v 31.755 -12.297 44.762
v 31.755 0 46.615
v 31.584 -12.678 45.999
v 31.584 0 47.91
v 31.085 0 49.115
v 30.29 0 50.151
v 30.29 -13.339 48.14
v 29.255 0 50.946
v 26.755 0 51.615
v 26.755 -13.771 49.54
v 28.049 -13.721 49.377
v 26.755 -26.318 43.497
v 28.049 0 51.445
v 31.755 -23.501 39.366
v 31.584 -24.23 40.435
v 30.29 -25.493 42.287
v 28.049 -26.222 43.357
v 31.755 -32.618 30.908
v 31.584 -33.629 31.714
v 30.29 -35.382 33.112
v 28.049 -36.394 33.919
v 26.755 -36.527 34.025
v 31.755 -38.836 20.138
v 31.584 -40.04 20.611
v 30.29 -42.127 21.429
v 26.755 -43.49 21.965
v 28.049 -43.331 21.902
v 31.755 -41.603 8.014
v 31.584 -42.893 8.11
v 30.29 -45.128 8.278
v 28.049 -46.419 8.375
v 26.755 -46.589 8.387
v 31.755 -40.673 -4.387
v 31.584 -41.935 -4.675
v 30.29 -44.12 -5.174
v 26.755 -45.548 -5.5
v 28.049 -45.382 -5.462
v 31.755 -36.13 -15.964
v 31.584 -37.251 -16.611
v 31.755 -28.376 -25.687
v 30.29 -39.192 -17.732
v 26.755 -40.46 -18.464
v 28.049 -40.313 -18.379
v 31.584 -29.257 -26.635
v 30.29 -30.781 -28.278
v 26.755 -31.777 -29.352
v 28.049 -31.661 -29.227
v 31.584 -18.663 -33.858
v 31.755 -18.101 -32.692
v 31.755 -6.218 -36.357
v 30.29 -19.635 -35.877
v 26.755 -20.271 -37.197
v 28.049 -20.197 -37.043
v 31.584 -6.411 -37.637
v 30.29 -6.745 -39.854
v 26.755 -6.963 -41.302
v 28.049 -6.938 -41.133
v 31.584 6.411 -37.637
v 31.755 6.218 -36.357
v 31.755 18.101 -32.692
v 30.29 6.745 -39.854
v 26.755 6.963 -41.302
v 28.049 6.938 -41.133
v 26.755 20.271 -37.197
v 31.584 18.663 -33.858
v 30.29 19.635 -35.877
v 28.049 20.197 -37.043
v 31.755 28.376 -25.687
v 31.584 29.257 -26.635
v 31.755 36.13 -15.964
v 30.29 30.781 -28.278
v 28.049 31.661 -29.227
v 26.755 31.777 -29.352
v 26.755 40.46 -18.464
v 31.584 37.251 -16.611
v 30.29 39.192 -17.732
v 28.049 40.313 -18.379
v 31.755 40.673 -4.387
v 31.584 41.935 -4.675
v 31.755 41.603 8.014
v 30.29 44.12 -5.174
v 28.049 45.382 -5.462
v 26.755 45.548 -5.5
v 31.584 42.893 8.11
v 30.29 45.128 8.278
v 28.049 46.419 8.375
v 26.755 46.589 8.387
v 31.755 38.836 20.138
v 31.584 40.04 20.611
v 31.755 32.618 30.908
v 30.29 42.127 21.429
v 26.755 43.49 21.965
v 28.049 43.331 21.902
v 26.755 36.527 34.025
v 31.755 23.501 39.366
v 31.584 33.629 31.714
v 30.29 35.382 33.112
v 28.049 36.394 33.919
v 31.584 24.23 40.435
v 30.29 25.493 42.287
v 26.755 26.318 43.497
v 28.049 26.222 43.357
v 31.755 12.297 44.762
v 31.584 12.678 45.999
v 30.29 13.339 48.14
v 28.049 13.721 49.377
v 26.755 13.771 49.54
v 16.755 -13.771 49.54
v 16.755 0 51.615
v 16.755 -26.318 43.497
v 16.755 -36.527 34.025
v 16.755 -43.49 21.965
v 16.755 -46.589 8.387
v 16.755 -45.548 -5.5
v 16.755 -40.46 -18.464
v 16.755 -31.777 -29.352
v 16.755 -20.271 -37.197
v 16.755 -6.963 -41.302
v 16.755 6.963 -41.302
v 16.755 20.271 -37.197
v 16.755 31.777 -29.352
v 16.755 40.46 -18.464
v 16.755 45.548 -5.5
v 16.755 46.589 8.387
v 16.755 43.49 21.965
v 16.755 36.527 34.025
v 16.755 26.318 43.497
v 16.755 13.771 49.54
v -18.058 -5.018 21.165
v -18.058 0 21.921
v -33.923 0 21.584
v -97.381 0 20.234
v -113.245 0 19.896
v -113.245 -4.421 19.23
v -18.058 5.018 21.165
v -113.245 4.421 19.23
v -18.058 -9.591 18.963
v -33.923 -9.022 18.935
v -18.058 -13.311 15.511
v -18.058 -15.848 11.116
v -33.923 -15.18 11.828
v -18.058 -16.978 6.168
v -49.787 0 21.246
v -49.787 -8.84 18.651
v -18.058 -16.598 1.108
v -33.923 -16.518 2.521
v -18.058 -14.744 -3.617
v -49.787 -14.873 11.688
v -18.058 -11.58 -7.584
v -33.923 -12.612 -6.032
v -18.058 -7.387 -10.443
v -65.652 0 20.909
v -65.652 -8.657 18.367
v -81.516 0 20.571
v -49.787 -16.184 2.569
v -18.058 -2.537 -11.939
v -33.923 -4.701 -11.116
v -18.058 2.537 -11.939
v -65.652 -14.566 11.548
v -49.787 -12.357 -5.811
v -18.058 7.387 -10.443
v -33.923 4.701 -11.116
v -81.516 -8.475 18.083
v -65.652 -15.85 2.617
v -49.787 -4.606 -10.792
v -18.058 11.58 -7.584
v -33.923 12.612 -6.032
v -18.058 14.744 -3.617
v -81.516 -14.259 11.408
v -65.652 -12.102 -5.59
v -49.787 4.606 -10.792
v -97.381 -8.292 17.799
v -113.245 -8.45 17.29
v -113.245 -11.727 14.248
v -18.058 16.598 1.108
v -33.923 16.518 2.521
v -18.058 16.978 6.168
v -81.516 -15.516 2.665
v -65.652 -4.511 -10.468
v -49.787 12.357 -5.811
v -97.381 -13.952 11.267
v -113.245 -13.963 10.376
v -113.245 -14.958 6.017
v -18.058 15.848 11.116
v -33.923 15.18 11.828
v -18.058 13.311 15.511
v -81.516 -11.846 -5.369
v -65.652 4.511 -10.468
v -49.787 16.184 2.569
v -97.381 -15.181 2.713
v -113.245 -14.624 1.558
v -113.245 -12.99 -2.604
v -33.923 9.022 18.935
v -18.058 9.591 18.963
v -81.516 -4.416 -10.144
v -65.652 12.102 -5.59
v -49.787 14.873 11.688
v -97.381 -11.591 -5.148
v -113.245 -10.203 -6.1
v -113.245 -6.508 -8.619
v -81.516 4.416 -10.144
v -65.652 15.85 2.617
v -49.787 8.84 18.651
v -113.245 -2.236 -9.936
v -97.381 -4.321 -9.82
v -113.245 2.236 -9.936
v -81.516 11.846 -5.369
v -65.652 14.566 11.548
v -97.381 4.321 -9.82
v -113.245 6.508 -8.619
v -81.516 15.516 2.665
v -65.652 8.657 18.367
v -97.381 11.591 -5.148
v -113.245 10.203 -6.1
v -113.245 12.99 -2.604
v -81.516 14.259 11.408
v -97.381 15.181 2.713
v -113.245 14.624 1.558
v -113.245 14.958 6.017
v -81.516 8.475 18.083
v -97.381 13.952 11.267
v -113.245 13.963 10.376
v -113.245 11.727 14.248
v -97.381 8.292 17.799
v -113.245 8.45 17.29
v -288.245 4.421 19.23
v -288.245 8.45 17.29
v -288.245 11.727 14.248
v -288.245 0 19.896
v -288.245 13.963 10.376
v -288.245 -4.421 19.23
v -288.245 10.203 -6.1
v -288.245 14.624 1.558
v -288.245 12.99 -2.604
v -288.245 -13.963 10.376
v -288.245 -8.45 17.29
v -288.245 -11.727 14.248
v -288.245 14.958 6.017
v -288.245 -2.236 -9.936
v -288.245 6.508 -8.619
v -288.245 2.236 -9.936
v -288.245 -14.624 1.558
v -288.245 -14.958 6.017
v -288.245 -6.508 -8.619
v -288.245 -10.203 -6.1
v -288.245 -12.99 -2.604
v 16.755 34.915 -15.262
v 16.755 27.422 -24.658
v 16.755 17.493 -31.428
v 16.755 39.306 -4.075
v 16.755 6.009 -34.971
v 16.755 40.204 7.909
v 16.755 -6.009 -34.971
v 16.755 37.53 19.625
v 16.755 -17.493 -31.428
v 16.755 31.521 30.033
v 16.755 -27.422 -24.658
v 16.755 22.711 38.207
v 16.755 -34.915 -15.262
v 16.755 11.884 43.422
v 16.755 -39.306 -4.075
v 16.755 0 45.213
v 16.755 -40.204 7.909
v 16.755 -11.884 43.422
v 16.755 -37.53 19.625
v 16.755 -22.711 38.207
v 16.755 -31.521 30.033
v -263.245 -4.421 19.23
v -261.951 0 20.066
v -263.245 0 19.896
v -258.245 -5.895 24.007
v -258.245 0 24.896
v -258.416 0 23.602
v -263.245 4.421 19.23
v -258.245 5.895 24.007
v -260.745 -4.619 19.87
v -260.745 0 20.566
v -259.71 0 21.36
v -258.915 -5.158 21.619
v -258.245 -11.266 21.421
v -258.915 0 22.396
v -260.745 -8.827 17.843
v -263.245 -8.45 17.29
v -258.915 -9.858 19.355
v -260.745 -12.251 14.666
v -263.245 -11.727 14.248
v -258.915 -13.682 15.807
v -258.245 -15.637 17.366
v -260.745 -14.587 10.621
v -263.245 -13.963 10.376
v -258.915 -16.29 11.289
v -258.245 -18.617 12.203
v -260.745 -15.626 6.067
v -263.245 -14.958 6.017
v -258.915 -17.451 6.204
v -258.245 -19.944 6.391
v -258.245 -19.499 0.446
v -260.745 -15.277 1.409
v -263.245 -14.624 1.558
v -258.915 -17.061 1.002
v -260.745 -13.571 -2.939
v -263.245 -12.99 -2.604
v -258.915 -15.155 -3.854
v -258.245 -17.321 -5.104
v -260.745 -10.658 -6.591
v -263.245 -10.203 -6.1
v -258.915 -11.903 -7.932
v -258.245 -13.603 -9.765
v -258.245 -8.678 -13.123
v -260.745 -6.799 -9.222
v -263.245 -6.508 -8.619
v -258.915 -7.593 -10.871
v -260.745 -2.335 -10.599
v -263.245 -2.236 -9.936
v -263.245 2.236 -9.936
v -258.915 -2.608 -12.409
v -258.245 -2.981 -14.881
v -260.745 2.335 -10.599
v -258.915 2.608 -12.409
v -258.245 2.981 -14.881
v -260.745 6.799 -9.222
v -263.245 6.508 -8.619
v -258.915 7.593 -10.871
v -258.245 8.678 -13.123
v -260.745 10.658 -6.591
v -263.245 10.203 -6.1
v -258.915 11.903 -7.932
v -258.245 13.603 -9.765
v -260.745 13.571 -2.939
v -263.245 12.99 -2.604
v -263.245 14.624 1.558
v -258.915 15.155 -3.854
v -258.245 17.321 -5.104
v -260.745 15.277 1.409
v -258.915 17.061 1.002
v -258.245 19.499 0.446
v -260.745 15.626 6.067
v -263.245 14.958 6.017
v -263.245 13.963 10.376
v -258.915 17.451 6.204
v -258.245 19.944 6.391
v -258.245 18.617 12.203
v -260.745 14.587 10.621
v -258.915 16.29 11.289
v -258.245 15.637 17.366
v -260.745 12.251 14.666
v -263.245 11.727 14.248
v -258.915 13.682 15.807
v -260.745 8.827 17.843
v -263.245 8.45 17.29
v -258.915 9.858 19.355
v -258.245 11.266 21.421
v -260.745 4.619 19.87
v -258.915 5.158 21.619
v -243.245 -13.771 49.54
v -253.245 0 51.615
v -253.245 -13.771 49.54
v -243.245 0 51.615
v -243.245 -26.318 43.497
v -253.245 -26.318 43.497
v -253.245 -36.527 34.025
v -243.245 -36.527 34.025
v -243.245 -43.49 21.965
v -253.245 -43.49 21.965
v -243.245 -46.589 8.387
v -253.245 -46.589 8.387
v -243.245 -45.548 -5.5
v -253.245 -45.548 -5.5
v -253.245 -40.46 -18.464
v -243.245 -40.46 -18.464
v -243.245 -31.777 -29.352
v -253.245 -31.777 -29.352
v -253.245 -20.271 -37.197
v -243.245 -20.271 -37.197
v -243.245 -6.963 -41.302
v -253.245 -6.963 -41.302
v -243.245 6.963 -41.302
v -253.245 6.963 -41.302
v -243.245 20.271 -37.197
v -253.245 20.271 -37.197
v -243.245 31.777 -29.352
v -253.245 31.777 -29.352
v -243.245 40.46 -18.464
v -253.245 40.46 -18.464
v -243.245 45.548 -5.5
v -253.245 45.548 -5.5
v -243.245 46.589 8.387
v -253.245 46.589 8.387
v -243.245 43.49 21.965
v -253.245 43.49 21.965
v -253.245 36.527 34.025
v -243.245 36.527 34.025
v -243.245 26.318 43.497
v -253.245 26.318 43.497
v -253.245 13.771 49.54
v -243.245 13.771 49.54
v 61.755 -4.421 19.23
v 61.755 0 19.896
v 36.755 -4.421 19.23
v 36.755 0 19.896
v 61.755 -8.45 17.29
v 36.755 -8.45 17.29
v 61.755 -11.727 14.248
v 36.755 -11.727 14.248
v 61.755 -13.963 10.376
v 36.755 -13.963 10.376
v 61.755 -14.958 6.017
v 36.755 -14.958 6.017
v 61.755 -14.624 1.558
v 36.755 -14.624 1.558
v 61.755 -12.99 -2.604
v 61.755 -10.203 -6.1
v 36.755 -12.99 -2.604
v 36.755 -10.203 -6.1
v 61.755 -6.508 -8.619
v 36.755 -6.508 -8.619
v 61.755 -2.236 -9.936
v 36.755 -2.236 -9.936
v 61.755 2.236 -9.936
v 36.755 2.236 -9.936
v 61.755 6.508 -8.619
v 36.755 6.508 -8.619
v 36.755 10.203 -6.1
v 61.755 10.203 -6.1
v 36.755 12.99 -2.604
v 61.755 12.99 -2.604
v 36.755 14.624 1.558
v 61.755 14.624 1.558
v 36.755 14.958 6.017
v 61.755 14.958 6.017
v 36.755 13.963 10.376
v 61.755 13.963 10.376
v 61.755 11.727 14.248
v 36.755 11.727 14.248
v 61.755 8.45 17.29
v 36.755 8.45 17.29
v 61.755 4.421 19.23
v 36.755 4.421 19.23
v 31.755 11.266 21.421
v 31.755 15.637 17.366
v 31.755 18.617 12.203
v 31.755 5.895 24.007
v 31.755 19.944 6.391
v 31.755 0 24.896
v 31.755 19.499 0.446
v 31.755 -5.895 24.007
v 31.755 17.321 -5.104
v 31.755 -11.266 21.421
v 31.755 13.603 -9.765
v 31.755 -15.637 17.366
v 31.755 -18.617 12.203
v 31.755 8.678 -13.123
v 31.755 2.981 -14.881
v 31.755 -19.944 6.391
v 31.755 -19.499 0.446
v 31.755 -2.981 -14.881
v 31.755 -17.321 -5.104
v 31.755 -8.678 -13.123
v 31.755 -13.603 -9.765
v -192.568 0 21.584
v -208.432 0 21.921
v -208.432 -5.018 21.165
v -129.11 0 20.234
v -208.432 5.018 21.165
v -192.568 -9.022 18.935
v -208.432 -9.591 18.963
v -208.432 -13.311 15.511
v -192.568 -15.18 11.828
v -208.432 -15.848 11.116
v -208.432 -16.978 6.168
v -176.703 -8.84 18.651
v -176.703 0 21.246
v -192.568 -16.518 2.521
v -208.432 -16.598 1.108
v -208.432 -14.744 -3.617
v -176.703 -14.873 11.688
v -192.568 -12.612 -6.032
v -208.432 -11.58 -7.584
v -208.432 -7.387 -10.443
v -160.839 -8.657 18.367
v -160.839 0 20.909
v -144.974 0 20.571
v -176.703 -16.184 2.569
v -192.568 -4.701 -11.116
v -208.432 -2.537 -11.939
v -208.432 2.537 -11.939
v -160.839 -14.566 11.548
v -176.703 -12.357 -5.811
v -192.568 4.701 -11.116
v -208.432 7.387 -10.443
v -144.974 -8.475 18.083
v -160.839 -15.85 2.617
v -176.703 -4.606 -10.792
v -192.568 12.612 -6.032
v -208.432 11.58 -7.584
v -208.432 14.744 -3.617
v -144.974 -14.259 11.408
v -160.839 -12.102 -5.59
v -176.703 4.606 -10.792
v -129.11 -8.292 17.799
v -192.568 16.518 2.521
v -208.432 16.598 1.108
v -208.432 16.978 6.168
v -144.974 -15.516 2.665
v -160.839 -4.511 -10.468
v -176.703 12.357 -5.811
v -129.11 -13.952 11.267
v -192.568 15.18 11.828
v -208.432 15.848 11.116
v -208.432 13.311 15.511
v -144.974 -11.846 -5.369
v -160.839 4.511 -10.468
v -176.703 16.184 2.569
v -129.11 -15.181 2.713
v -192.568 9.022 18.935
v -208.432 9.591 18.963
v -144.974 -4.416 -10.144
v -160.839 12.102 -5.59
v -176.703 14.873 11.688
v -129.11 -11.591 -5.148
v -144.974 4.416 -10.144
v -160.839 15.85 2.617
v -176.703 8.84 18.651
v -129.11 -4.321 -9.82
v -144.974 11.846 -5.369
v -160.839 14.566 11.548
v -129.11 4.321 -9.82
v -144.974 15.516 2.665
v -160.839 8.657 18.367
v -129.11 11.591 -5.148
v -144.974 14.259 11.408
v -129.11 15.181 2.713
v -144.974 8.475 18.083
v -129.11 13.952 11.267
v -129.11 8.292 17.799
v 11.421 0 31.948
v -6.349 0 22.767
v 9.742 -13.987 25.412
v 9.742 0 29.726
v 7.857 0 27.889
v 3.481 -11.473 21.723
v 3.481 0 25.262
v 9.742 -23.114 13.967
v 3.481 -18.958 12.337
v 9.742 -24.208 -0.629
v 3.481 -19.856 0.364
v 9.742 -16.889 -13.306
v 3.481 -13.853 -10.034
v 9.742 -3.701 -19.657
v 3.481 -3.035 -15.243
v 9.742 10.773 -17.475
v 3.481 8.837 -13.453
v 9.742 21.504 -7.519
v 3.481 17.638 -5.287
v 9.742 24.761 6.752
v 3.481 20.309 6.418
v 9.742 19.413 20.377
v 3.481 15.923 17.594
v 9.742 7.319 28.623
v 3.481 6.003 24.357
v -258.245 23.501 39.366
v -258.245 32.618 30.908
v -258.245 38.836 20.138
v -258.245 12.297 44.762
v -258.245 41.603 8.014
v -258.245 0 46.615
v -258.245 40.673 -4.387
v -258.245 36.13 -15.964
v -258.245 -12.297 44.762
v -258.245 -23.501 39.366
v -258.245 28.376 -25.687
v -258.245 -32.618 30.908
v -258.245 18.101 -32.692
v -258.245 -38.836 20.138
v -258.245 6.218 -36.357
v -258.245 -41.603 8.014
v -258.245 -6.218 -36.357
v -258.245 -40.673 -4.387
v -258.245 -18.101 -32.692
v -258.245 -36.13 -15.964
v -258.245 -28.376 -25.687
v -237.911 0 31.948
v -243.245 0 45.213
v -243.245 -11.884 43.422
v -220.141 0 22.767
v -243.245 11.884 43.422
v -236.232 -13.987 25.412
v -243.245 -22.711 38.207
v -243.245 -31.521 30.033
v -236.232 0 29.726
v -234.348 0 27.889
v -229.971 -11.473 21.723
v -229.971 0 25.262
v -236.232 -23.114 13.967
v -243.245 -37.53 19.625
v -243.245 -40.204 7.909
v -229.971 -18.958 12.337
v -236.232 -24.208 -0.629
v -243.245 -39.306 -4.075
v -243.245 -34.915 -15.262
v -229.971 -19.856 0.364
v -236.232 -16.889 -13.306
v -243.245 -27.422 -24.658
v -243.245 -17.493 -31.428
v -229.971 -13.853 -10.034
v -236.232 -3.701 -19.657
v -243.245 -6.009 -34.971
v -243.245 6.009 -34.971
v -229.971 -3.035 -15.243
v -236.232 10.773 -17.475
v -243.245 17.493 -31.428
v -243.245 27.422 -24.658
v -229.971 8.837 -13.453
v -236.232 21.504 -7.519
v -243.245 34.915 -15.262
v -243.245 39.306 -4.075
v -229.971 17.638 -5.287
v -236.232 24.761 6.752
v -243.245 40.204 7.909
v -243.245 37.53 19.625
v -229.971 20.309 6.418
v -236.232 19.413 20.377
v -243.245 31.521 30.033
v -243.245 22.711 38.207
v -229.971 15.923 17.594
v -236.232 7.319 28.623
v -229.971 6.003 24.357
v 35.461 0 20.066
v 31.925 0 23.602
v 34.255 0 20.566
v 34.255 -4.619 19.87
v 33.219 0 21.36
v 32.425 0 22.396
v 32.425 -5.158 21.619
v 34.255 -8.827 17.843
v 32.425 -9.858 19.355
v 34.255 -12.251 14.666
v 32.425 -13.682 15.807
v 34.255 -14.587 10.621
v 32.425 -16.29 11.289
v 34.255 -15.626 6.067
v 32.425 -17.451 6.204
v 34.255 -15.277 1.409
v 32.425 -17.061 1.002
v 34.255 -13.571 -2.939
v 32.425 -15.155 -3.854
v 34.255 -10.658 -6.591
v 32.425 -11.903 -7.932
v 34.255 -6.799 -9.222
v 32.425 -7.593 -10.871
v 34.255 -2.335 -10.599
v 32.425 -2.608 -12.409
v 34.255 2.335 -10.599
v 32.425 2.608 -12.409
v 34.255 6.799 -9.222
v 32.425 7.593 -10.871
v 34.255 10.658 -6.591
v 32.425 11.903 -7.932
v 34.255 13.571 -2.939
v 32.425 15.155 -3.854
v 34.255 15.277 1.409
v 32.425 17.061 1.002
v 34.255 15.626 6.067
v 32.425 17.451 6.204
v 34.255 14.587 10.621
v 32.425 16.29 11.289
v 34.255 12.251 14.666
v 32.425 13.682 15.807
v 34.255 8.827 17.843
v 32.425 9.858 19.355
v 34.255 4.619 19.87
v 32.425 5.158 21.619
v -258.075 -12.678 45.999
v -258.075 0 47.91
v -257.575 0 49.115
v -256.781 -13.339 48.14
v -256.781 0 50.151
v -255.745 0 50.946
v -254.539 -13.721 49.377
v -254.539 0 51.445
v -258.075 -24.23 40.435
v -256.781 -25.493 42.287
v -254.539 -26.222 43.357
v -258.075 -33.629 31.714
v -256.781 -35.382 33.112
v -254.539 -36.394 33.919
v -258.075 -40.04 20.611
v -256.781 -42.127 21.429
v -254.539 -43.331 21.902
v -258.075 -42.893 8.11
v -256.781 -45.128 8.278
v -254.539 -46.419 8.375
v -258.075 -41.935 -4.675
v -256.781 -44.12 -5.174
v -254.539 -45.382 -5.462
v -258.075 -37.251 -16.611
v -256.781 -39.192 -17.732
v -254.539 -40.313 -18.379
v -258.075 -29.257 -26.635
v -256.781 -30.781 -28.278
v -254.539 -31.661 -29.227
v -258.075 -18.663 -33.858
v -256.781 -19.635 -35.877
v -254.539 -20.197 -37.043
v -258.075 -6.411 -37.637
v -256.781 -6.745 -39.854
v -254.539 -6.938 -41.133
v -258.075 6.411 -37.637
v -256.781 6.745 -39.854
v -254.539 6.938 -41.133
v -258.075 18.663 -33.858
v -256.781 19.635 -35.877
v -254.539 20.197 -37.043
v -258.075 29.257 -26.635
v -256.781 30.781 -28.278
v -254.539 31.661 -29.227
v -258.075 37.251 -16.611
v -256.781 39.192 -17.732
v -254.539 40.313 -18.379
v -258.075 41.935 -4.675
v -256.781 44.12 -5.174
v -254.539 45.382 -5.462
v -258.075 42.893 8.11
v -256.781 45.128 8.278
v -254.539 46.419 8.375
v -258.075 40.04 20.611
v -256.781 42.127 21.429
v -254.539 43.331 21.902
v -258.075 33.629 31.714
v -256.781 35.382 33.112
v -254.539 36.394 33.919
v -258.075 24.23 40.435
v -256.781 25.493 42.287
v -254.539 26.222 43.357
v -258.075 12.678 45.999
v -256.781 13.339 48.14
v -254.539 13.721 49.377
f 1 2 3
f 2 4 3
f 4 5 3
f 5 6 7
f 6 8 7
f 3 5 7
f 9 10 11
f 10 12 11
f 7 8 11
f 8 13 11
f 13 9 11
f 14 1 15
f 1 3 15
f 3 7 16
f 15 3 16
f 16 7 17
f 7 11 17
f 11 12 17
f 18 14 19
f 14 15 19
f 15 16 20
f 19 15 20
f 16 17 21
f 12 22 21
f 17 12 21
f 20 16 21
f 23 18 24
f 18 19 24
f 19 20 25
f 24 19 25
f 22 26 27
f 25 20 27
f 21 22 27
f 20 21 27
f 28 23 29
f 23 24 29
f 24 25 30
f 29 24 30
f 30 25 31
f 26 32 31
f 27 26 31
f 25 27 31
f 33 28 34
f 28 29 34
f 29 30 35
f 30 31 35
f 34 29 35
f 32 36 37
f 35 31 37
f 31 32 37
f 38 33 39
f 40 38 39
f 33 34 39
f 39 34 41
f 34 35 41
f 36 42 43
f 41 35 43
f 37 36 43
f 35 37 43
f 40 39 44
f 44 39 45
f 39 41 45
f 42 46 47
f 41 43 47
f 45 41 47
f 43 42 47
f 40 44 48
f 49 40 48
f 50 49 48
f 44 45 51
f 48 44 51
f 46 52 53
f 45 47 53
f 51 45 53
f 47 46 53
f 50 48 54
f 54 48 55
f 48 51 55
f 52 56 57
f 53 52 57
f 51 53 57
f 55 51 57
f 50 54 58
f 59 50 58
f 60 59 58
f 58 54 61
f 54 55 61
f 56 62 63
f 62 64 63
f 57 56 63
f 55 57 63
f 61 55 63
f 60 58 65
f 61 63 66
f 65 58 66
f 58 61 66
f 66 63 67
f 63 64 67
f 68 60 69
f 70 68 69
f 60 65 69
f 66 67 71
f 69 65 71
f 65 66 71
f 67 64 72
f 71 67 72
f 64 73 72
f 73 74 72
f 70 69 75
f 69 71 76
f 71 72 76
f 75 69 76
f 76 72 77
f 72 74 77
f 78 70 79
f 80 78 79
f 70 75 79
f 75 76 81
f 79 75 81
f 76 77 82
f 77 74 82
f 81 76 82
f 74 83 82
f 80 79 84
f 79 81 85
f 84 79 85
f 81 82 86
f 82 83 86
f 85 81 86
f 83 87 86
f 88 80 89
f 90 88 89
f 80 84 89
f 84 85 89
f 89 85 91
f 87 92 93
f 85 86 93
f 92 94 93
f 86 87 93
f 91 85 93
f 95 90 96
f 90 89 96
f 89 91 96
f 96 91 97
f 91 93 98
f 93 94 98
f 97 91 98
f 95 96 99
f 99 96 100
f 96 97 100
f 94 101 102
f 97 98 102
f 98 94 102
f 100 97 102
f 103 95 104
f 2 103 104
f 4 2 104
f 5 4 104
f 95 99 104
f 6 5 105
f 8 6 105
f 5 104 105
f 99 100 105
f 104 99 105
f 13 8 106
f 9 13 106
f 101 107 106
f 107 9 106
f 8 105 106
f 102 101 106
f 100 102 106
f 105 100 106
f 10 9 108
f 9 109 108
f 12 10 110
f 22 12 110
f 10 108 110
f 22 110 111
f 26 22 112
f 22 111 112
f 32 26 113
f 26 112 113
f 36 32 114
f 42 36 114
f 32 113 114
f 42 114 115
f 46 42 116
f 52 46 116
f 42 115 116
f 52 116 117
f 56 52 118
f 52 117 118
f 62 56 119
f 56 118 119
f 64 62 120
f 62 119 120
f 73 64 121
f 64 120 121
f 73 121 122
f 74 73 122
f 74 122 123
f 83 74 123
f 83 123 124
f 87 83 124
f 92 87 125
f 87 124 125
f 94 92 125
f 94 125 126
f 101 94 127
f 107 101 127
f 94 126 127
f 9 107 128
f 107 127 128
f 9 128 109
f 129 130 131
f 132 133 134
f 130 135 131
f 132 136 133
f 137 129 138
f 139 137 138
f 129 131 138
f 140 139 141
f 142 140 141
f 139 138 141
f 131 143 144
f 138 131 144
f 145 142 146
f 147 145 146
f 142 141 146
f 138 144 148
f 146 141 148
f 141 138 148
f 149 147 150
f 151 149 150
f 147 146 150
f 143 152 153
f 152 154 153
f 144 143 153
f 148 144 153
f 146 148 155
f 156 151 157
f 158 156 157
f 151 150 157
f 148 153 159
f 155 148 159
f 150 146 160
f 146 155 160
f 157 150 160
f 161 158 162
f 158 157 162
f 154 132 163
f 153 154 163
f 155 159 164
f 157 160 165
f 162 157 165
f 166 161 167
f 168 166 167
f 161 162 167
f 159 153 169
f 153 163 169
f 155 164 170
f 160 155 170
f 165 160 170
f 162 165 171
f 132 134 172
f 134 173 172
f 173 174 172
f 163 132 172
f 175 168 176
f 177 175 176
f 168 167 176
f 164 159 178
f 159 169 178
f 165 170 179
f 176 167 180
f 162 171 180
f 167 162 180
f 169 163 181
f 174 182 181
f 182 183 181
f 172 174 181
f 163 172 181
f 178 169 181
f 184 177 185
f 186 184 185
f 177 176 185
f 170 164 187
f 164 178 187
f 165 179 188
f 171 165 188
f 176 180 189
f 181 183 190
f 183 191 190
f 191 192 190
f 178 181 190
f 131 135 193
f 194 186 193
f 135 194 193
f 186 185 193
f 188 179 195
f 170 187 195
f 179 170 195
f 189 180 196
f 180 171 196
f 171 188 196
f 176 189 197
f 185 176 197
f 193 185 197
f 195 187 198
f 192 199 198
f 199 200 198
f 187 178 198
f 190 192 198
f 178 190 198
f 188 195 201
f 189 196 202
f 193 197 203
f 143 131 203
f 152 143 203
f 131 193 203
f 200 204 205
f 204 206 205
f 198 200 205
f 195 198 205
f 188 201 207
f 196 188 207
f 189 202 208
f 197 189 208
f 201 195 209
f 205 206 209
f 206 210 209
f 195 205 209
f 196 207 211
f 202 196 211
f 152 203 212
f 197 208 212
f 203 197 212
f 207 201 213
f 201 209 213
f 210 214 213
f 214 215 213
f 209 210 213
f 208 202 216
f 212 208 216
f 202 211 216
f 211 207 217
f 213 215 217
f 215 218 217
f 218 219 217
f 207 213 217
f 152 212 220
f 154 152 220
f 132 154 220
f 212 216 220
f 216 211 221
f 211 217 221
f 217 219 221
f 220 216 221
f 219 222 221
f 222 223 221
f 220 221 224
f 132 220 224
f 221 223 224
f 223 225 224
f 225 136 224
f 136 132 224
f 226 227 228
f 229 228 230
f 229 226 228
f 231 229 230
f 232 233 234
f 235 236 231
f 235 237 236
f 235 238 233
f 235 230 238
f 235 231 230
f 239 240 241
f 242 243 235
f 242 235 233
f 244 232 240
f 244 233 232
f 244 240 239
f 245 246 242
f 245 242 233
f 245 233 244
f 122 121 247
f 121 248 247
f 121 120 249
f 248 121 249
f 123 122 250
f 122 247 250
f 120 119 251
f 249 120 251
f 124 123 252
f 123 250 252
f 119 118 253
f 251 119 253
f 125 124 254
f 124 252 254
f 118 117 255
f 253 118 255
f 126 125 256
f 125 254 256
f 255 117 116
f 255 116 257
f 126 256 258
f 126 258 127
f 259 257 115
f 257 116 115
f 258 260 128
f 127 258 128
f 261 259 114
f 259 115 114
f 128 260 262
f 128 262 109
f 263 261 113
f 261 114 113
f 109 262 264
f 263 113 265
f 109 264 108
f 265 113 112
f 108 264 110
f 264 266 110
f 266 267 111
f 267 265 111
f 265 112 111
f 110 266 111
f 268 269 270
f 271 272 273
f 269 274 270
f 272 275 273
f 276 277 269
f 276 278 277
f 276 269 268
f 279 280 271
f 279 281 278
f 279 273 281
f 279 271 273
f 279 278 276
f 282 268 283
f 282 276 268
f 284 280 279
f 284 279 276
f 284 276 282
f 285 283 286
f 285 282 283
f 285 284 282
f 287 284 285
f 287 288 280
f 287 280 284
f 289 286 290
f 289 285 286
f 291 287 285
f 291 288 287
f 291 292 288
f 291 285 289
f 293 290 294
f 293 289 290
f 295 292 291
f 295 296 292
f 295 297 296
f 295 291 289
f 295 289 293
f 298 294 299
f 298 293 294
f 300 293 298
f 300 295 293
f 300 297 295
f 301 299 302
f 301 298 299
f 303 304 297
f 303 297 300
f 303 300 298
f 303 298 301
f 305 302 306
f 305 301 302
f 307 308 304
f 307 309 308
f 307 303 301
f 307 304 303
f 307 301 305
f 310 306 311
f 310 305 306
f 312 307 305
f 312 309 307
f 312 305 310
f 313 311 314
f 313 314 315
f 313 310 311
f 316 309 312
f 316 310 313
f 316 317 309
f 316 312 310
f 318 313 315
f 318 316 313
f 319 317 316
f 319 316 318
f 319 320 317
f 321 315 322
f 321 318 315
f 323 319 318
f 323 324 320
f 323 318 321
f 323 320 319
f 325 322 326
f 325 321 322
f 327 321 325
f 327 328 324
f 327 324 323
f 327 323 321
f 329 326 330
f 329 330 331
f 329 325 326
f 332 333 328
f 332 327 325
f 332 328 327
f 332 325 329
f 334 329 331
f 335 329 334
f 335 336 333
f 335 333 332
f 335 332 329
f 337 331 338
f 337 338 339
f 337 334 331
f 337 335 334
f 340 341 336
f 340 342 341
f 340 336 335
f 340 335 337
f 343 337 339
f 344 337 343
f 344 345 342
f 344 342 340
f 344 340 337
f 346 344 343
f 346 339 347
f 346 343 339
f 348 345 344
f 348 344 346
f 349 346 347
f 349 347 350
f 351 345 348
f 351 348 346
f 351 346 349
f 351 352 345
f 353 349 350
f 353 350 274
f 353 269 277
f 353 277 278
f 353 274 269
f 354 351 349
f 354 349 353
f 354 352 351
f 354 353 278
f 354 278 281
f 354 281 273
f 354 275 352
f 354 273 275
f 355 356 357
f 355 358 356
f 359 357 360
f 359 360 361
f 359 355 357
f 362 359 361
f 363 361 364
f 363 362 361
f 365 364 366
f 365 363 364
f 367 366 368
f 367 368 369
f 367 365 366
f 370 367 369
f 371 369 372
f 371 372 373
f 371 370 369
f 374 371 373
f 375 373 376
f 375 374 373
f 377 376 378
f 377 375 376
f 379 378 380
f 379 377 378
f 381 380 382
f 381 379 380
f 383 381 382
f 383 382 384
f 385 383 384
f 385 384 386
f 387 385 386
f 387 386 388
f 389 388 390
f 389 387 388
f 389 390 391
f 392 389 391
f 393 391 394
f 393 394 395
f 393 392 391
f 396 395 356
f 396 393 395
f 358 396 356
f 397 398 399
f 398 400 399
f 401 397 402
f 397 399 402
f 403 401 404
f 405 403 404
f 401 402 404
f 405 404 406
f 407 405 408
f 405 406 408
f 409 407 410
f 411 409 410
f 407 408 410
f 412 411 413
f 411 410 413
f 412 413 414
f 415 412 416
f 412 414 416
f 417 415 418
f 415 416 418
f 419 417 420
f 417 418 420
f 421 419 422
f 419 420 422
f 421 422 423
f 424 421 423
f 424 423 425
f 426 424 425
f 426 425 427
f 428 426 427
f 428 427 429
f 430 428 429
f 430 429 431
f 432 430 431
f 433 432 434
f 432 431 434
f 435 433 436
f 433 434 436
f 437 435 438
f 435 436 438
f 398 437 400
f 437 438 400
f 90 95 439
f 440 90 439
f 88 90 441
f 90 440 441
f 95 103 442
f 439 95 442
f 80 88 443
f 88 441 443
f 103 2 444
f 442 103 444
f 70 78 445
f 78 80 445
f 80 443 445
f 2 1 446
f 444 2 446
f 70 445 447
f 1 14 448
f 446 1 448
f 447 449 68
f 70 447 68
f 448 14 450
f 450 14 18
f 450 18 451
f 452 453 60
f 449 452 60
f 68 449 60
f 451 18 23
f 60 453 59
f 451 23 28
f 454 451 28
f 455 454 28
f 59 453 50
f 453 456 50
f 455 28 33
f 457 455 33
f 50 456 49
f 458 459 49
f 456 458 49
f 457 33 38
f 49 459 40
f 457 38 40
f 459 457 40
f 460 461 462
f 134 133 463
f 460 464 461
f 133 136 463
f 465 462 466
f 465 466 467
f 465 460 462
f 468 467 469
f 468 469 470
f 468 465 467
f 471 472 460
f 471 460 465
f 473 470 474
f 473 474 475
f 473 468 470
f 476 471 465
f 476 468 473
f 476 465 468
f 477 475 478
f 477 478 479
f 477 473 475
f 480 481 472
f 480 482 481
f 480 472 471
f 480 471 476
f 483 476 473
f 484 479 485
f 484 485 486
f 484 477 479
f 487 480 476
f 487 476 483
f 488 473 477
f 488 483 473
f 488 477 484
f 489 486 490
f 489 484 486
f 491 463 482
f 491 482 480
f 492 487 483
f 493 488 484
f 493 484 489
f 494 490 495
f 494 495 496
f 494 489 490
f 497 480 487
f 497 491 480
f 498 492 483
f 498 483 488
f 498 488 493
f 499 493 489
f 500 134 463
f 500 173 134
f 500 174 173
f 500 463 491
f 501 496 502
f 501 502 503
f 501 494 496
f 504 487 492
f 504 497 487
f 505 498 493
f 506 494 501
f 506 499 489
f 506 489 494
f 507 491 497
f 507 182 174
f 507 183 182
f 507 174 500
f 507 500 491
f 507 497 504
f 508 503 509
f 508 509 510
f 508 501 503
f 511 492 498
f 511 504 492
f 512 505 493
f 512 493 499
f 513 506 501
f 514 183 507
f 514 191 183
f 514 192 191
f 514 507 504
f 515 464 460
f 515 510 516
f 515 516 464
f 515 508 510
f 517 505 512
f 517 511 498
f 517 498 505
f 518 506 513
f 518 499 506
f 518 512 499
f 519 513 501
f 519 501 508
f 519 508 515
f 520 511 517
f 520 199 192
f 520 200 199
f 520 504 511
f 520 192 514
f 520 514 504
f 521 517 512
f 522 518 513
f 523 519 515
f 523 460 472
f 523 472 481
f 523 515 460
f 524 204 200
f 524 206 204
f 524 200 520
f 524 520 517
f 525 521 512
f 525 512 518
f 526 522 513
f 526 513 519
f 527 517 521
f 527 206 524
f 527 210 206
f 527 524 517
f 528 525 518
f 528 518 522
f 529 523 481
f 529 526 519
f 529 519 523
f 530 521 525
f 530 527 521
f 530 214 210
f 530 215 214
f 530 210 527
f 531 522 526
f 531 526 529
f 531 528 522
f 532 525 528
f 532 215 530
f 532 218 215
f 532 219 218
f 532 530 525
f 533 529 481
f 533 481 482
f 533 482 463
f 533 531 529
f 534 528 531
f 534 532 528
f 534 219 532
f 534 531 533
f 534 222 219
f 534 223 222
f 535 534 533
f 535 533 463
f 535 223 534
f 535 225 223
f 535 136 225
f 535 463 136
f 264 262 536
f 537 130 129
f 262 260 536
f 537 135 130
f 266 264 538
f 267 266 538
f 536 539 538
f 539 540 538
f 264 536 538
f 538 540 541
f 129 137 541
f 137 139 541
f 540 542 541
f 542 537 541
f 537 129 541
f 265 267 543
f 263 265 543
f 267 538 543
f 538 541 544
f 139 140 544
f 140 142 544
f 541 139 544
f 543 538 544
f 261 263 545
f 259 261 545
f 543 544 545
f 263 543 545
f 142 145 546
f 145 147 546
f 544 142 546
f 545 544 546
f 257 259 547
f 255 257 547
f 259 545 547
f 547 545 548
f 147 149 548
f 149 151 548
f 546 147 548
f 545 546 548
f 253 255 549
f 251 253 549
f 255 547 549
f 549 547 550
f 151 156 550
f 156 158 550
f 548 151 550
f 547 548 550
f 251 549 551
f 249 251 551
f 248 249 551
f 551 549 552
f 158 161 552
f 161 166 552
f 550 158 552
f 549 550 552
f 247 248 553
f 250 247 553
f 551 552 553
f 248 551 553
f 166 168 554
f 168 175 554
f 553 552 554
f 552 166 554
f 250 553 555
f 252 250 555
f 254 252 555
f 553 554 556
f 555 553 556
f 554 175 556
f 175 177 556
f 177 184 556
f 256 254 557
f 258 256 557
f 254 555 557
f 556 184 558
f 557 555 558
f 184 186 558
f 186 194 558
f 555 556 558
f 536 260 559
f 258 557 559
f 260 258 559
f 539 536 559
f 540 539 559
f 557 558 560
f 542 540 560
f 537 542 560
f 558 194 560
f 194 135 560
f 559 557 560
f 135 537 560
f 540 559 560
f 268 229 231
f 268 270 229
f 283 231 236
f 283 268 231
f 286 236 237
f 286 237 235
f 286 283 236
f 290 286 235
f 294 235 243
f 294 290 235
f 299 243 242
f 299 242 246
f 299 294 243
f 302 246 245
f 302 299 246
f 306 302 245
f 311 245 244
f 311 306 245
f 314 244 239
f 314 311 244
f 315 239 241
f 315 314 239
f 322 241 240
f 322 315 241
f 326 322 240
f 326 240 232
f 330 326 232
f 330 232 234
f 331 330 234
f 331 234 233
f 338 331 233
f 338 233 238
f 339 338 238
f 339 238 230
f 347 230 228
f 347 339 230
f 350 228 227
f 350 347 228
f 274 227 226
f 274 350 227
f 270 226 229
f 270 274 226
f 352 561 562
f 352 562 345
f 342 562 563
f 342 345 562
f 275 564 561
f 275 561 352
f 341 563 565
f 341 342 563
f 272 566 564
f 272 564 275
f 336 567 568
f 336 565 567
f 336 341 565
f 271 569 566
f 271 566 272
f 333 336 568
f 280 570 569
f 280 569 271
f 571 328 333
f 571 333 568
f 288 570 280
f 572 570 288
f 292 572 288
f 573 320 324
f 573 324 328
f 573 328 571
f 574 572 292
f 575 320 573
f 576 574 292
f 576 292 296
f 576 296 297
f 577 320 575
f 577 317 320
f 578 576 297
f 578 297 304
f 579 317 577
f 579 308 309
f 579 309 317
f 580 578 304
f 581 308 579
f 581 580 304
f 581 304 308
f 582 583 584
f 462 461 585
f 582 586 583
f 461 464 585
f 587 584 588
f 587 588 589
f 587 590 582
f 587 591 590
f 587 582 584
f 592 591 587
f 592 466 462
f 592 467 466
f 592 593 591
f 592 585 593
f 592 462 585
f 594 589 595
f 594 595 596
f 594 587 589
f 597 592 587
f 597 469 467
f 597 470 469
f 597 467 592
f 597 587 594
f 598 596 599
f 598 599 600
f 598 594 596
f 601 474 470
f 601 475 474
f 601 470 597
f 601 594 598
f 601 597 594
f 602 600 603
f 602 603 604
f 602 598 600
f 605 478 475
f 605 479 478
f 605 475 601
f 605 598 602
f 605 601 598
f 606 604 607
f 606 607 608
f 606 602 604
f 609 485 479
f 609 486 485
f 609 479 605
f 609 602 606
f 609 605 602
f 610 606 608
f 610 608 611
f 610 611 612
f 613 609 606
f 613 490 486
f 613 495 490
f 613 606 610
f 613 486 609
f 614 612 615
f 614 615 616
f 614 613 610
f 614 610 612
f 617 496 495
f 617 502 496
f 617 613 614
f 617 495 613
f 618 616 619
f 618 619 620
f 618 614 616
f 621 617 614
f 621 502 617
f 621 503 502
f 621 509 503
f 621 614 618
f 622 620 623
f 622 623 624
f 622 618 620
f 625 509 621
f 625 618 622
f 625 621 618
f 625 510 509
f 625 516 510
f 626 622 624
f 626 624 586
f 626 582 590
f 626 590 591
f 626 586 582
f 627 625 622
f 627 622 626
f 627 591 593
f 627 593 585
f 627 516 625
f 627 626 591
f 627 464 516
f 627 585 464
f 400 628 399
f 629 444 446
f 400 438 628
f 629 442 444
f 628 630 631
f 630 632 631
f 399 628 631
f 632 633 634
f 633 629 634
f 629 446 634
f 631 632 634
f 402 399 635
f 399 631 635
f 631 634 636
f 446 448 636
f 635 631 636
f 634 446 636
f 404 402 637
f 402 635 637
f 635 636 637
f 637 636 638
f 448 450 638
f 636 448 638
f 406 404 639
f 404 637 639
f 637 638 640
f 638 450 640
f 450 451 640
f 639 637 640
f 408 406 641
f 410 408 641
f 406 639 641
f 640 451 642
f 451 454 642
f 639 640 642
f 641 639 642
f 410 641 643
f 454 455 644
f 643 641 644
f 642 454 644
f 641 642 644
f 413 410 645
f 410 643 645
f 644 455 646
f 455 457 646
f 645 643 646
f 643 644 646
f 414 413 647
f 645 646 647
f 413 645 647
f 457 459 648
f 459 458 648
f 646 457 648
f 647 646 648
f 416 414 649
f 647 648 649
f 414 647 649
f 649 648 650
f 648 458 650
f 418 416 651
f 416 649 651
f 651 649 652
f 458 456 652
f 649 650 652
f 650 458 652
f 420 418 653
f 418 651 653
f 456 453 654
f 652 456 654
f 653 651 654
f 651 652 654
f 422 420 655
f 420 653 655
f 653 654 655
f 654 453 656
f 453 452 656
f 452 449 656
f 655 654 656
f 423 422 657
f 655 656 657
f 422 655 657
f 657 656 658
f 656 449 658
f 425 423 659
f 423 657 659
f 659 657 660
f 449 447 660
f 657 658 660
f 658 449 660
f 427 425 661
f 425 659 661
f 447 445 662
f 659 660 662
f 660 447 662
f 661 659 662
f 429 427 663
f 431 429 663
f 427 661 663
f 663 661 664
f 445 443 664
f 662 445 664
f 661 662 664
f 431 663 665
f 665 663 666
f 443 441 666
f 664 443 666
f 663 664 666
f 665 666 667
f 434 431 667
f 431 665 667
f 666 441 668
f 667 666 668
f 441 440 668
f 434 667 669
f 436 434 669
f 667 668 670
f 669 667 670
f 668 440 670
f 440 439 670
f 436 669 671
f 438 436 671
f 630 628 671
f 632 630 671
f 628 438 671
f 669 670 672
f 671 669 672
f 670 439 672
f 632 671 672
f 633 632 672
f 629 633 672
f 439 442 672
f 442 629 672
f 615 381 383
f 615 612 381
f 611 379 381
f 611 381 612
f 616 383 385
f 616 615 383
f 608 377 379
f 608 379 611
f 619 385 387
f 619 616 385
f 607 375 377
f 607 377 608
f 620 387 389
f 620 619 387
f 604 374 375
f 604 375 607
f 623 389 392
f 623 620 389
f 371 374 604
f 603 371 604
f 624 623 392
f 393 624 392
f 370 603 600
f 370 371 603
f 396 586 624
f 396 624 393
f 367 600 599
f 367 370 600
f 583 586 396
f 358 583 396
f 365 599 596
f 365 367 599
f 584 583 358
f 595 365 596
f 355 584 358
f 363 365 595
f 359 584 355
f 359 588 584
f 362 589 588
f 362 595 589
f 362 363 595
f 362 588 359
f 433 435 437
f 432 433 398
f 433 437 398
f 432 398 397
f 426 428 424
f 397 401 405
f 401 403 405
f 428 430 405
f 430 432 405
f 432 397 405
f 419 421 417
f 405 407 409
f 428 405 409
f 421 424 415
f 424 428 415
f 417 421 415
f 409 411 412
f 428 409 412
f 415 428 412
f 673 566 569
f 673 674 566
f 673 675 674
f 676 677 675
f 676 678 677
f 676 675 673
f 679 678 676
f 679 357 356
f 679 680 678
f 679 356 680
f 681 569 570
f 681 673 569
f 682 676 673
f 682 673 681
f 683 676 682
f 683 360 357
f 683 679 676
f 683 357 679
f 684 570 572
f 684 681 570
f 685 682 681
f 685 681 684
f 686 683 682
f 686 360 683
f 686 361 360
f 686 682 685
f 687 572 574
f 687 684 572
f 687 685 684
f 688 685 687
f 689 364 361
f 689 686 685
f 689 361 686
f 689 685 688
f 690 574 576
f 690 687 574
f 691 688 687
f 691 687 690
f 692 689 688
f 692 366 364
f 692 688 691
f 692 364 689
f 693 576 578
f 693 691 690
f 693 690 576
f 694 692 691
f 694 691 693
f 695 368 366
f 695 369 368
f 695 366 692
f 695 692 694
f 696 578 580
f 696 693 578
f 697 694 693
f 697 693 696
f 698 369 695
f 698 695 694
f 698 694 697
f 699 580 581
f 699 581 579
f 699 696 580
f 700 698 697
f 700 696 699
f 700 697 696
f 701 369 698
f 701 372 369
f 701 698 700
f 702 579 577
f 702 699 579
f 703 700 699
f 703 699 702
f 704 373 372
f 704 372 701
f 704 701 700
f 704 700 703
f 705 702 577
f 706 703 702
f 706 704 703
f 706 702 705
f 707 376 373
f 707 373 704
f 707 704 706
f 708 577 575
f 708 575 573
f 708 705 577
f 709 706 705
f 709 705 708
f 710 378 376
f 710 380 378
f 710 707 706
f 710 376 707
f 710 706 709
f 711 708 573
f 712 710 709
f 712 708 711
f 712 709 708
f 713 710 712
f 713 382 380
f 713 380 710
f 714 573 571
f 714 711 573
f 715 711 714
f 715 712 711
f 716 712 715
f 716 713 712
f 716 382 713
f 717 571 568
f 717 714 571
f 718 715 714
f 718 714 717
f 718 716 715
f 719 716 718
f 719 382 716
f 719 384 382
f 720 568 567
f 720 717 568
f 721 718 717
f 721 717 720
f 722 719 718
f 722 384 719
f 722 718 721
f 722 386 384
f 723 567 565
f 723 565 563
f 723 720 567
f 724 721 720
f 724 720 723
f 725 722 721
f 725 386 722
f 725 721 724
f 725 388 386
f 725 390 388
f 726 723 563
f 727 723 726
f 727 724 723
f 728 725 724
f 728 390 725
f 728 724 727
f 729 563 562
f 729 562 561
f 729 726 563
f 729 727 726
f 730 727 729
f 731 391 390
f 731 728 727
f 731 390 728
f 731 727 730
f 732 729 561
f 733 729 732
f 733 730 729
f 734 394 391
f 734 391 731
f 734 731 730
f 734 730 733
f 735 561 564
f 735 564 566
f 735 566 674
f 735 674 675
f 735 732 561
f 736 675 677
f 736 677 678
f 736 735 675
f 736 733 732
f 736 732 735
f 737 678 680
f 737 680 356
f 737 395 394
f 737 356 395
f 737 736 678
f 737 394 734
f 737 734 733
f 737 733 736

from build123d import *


with BuildPart() as f1:
    # F0 (on Front) → F1 (revolve)
    with BuildSketch(Plane.XZ):
        with BuildLine():
            Line((-24.9903301983, 21.7737406916), (-113.2452650991, 19.8959766657))
            Line((-113.2452650991, 19.8959766657), (-113.2452650991, 4.8959766657))
            Line((-113.2452650991, 4.8959766657), (61.7547349009, 4.8959766657))
            Line((61.7547349009, 4.8959766657), (61.7547349009, 19.8959766657))
            Line((61.7547349009, 19.8959766657), (36.7547349009, 19.8959766657))
            ThreePointArc((36.7547349009, 19.8959766657), (33.2192009949, 21.3604427598), (31.7547349009, 24.8959766657))
            Line((31.7547349009, 24.8959766657), (31.7547349009, 46.6154164807))
            ThreePointArc((31.7547349009, 46.6154164807), (30.2902688068, 50.1509503867), (26.7547349009, 51.6154164807))
            Line((26.7547349009, 51.6154164807), (16.7547349009, 51.6154164807))
            Line((16.7547349009, 51.6154164807), (16.7547349009, 45.2127791941))
            add(Edge.make_bspline(
                [(16.7547349009, 45.2127791941), (14.6425744881, 38.1953757962), (10.3697433231, 23.9993991291), (-8.0631348251, 22.2263150664), (-18.0584447884, 21.9212275723)],
                knots=[0, 0, 0, 0, 0.4430583211, 0.8962924364, 0.8962924364, 0.8962924364, 0.8962924364], degree=3))
            add(Edge.make_bspline(
                [(-18.0584447884, 21.9212275723), (-20.3455392693, 21.8514184391), (-22.6679347338, 21.8125795654), (-24.9903301983, 21.7737406916)],
                knots=[0.8962924364, 0.8962924364, 0.8962924364, 0.8962924364, 1, 1, 1, 1], degree=3))
        make_face()
        with BuildLine():
            Line((-18.0584447884, 21.9212275723), (-24.9903301983, 21.7737406916))
            add(Edge.make_bspline(
                [(-18.0584447884, 21.9212275723), (-20.3455392693, 21.8514184391), (-22.6679347338, 21.8125795654), (-24.9903301983, 21.7737406916)],
                knots=[0.8962924364, 0.8962924364, 0.8962924364, 0.8962924364, 1, 1, 1, 1], degree=3))
        make_face()
    revolve(axis=Axis((-25.7452650991, 0, 4.8959766657), (1, 0, 0)))

    # F2: F1 across face


with BuildPart() as f1_1:
    add(f1.part)
    add(f1.part.mirror(Plane(origin=(-113.2452650991, 0, 4.8959766657), x_dir=(0, -1, 0), z_dir=(-1, 0, 0))))


solid = f1_1.part
